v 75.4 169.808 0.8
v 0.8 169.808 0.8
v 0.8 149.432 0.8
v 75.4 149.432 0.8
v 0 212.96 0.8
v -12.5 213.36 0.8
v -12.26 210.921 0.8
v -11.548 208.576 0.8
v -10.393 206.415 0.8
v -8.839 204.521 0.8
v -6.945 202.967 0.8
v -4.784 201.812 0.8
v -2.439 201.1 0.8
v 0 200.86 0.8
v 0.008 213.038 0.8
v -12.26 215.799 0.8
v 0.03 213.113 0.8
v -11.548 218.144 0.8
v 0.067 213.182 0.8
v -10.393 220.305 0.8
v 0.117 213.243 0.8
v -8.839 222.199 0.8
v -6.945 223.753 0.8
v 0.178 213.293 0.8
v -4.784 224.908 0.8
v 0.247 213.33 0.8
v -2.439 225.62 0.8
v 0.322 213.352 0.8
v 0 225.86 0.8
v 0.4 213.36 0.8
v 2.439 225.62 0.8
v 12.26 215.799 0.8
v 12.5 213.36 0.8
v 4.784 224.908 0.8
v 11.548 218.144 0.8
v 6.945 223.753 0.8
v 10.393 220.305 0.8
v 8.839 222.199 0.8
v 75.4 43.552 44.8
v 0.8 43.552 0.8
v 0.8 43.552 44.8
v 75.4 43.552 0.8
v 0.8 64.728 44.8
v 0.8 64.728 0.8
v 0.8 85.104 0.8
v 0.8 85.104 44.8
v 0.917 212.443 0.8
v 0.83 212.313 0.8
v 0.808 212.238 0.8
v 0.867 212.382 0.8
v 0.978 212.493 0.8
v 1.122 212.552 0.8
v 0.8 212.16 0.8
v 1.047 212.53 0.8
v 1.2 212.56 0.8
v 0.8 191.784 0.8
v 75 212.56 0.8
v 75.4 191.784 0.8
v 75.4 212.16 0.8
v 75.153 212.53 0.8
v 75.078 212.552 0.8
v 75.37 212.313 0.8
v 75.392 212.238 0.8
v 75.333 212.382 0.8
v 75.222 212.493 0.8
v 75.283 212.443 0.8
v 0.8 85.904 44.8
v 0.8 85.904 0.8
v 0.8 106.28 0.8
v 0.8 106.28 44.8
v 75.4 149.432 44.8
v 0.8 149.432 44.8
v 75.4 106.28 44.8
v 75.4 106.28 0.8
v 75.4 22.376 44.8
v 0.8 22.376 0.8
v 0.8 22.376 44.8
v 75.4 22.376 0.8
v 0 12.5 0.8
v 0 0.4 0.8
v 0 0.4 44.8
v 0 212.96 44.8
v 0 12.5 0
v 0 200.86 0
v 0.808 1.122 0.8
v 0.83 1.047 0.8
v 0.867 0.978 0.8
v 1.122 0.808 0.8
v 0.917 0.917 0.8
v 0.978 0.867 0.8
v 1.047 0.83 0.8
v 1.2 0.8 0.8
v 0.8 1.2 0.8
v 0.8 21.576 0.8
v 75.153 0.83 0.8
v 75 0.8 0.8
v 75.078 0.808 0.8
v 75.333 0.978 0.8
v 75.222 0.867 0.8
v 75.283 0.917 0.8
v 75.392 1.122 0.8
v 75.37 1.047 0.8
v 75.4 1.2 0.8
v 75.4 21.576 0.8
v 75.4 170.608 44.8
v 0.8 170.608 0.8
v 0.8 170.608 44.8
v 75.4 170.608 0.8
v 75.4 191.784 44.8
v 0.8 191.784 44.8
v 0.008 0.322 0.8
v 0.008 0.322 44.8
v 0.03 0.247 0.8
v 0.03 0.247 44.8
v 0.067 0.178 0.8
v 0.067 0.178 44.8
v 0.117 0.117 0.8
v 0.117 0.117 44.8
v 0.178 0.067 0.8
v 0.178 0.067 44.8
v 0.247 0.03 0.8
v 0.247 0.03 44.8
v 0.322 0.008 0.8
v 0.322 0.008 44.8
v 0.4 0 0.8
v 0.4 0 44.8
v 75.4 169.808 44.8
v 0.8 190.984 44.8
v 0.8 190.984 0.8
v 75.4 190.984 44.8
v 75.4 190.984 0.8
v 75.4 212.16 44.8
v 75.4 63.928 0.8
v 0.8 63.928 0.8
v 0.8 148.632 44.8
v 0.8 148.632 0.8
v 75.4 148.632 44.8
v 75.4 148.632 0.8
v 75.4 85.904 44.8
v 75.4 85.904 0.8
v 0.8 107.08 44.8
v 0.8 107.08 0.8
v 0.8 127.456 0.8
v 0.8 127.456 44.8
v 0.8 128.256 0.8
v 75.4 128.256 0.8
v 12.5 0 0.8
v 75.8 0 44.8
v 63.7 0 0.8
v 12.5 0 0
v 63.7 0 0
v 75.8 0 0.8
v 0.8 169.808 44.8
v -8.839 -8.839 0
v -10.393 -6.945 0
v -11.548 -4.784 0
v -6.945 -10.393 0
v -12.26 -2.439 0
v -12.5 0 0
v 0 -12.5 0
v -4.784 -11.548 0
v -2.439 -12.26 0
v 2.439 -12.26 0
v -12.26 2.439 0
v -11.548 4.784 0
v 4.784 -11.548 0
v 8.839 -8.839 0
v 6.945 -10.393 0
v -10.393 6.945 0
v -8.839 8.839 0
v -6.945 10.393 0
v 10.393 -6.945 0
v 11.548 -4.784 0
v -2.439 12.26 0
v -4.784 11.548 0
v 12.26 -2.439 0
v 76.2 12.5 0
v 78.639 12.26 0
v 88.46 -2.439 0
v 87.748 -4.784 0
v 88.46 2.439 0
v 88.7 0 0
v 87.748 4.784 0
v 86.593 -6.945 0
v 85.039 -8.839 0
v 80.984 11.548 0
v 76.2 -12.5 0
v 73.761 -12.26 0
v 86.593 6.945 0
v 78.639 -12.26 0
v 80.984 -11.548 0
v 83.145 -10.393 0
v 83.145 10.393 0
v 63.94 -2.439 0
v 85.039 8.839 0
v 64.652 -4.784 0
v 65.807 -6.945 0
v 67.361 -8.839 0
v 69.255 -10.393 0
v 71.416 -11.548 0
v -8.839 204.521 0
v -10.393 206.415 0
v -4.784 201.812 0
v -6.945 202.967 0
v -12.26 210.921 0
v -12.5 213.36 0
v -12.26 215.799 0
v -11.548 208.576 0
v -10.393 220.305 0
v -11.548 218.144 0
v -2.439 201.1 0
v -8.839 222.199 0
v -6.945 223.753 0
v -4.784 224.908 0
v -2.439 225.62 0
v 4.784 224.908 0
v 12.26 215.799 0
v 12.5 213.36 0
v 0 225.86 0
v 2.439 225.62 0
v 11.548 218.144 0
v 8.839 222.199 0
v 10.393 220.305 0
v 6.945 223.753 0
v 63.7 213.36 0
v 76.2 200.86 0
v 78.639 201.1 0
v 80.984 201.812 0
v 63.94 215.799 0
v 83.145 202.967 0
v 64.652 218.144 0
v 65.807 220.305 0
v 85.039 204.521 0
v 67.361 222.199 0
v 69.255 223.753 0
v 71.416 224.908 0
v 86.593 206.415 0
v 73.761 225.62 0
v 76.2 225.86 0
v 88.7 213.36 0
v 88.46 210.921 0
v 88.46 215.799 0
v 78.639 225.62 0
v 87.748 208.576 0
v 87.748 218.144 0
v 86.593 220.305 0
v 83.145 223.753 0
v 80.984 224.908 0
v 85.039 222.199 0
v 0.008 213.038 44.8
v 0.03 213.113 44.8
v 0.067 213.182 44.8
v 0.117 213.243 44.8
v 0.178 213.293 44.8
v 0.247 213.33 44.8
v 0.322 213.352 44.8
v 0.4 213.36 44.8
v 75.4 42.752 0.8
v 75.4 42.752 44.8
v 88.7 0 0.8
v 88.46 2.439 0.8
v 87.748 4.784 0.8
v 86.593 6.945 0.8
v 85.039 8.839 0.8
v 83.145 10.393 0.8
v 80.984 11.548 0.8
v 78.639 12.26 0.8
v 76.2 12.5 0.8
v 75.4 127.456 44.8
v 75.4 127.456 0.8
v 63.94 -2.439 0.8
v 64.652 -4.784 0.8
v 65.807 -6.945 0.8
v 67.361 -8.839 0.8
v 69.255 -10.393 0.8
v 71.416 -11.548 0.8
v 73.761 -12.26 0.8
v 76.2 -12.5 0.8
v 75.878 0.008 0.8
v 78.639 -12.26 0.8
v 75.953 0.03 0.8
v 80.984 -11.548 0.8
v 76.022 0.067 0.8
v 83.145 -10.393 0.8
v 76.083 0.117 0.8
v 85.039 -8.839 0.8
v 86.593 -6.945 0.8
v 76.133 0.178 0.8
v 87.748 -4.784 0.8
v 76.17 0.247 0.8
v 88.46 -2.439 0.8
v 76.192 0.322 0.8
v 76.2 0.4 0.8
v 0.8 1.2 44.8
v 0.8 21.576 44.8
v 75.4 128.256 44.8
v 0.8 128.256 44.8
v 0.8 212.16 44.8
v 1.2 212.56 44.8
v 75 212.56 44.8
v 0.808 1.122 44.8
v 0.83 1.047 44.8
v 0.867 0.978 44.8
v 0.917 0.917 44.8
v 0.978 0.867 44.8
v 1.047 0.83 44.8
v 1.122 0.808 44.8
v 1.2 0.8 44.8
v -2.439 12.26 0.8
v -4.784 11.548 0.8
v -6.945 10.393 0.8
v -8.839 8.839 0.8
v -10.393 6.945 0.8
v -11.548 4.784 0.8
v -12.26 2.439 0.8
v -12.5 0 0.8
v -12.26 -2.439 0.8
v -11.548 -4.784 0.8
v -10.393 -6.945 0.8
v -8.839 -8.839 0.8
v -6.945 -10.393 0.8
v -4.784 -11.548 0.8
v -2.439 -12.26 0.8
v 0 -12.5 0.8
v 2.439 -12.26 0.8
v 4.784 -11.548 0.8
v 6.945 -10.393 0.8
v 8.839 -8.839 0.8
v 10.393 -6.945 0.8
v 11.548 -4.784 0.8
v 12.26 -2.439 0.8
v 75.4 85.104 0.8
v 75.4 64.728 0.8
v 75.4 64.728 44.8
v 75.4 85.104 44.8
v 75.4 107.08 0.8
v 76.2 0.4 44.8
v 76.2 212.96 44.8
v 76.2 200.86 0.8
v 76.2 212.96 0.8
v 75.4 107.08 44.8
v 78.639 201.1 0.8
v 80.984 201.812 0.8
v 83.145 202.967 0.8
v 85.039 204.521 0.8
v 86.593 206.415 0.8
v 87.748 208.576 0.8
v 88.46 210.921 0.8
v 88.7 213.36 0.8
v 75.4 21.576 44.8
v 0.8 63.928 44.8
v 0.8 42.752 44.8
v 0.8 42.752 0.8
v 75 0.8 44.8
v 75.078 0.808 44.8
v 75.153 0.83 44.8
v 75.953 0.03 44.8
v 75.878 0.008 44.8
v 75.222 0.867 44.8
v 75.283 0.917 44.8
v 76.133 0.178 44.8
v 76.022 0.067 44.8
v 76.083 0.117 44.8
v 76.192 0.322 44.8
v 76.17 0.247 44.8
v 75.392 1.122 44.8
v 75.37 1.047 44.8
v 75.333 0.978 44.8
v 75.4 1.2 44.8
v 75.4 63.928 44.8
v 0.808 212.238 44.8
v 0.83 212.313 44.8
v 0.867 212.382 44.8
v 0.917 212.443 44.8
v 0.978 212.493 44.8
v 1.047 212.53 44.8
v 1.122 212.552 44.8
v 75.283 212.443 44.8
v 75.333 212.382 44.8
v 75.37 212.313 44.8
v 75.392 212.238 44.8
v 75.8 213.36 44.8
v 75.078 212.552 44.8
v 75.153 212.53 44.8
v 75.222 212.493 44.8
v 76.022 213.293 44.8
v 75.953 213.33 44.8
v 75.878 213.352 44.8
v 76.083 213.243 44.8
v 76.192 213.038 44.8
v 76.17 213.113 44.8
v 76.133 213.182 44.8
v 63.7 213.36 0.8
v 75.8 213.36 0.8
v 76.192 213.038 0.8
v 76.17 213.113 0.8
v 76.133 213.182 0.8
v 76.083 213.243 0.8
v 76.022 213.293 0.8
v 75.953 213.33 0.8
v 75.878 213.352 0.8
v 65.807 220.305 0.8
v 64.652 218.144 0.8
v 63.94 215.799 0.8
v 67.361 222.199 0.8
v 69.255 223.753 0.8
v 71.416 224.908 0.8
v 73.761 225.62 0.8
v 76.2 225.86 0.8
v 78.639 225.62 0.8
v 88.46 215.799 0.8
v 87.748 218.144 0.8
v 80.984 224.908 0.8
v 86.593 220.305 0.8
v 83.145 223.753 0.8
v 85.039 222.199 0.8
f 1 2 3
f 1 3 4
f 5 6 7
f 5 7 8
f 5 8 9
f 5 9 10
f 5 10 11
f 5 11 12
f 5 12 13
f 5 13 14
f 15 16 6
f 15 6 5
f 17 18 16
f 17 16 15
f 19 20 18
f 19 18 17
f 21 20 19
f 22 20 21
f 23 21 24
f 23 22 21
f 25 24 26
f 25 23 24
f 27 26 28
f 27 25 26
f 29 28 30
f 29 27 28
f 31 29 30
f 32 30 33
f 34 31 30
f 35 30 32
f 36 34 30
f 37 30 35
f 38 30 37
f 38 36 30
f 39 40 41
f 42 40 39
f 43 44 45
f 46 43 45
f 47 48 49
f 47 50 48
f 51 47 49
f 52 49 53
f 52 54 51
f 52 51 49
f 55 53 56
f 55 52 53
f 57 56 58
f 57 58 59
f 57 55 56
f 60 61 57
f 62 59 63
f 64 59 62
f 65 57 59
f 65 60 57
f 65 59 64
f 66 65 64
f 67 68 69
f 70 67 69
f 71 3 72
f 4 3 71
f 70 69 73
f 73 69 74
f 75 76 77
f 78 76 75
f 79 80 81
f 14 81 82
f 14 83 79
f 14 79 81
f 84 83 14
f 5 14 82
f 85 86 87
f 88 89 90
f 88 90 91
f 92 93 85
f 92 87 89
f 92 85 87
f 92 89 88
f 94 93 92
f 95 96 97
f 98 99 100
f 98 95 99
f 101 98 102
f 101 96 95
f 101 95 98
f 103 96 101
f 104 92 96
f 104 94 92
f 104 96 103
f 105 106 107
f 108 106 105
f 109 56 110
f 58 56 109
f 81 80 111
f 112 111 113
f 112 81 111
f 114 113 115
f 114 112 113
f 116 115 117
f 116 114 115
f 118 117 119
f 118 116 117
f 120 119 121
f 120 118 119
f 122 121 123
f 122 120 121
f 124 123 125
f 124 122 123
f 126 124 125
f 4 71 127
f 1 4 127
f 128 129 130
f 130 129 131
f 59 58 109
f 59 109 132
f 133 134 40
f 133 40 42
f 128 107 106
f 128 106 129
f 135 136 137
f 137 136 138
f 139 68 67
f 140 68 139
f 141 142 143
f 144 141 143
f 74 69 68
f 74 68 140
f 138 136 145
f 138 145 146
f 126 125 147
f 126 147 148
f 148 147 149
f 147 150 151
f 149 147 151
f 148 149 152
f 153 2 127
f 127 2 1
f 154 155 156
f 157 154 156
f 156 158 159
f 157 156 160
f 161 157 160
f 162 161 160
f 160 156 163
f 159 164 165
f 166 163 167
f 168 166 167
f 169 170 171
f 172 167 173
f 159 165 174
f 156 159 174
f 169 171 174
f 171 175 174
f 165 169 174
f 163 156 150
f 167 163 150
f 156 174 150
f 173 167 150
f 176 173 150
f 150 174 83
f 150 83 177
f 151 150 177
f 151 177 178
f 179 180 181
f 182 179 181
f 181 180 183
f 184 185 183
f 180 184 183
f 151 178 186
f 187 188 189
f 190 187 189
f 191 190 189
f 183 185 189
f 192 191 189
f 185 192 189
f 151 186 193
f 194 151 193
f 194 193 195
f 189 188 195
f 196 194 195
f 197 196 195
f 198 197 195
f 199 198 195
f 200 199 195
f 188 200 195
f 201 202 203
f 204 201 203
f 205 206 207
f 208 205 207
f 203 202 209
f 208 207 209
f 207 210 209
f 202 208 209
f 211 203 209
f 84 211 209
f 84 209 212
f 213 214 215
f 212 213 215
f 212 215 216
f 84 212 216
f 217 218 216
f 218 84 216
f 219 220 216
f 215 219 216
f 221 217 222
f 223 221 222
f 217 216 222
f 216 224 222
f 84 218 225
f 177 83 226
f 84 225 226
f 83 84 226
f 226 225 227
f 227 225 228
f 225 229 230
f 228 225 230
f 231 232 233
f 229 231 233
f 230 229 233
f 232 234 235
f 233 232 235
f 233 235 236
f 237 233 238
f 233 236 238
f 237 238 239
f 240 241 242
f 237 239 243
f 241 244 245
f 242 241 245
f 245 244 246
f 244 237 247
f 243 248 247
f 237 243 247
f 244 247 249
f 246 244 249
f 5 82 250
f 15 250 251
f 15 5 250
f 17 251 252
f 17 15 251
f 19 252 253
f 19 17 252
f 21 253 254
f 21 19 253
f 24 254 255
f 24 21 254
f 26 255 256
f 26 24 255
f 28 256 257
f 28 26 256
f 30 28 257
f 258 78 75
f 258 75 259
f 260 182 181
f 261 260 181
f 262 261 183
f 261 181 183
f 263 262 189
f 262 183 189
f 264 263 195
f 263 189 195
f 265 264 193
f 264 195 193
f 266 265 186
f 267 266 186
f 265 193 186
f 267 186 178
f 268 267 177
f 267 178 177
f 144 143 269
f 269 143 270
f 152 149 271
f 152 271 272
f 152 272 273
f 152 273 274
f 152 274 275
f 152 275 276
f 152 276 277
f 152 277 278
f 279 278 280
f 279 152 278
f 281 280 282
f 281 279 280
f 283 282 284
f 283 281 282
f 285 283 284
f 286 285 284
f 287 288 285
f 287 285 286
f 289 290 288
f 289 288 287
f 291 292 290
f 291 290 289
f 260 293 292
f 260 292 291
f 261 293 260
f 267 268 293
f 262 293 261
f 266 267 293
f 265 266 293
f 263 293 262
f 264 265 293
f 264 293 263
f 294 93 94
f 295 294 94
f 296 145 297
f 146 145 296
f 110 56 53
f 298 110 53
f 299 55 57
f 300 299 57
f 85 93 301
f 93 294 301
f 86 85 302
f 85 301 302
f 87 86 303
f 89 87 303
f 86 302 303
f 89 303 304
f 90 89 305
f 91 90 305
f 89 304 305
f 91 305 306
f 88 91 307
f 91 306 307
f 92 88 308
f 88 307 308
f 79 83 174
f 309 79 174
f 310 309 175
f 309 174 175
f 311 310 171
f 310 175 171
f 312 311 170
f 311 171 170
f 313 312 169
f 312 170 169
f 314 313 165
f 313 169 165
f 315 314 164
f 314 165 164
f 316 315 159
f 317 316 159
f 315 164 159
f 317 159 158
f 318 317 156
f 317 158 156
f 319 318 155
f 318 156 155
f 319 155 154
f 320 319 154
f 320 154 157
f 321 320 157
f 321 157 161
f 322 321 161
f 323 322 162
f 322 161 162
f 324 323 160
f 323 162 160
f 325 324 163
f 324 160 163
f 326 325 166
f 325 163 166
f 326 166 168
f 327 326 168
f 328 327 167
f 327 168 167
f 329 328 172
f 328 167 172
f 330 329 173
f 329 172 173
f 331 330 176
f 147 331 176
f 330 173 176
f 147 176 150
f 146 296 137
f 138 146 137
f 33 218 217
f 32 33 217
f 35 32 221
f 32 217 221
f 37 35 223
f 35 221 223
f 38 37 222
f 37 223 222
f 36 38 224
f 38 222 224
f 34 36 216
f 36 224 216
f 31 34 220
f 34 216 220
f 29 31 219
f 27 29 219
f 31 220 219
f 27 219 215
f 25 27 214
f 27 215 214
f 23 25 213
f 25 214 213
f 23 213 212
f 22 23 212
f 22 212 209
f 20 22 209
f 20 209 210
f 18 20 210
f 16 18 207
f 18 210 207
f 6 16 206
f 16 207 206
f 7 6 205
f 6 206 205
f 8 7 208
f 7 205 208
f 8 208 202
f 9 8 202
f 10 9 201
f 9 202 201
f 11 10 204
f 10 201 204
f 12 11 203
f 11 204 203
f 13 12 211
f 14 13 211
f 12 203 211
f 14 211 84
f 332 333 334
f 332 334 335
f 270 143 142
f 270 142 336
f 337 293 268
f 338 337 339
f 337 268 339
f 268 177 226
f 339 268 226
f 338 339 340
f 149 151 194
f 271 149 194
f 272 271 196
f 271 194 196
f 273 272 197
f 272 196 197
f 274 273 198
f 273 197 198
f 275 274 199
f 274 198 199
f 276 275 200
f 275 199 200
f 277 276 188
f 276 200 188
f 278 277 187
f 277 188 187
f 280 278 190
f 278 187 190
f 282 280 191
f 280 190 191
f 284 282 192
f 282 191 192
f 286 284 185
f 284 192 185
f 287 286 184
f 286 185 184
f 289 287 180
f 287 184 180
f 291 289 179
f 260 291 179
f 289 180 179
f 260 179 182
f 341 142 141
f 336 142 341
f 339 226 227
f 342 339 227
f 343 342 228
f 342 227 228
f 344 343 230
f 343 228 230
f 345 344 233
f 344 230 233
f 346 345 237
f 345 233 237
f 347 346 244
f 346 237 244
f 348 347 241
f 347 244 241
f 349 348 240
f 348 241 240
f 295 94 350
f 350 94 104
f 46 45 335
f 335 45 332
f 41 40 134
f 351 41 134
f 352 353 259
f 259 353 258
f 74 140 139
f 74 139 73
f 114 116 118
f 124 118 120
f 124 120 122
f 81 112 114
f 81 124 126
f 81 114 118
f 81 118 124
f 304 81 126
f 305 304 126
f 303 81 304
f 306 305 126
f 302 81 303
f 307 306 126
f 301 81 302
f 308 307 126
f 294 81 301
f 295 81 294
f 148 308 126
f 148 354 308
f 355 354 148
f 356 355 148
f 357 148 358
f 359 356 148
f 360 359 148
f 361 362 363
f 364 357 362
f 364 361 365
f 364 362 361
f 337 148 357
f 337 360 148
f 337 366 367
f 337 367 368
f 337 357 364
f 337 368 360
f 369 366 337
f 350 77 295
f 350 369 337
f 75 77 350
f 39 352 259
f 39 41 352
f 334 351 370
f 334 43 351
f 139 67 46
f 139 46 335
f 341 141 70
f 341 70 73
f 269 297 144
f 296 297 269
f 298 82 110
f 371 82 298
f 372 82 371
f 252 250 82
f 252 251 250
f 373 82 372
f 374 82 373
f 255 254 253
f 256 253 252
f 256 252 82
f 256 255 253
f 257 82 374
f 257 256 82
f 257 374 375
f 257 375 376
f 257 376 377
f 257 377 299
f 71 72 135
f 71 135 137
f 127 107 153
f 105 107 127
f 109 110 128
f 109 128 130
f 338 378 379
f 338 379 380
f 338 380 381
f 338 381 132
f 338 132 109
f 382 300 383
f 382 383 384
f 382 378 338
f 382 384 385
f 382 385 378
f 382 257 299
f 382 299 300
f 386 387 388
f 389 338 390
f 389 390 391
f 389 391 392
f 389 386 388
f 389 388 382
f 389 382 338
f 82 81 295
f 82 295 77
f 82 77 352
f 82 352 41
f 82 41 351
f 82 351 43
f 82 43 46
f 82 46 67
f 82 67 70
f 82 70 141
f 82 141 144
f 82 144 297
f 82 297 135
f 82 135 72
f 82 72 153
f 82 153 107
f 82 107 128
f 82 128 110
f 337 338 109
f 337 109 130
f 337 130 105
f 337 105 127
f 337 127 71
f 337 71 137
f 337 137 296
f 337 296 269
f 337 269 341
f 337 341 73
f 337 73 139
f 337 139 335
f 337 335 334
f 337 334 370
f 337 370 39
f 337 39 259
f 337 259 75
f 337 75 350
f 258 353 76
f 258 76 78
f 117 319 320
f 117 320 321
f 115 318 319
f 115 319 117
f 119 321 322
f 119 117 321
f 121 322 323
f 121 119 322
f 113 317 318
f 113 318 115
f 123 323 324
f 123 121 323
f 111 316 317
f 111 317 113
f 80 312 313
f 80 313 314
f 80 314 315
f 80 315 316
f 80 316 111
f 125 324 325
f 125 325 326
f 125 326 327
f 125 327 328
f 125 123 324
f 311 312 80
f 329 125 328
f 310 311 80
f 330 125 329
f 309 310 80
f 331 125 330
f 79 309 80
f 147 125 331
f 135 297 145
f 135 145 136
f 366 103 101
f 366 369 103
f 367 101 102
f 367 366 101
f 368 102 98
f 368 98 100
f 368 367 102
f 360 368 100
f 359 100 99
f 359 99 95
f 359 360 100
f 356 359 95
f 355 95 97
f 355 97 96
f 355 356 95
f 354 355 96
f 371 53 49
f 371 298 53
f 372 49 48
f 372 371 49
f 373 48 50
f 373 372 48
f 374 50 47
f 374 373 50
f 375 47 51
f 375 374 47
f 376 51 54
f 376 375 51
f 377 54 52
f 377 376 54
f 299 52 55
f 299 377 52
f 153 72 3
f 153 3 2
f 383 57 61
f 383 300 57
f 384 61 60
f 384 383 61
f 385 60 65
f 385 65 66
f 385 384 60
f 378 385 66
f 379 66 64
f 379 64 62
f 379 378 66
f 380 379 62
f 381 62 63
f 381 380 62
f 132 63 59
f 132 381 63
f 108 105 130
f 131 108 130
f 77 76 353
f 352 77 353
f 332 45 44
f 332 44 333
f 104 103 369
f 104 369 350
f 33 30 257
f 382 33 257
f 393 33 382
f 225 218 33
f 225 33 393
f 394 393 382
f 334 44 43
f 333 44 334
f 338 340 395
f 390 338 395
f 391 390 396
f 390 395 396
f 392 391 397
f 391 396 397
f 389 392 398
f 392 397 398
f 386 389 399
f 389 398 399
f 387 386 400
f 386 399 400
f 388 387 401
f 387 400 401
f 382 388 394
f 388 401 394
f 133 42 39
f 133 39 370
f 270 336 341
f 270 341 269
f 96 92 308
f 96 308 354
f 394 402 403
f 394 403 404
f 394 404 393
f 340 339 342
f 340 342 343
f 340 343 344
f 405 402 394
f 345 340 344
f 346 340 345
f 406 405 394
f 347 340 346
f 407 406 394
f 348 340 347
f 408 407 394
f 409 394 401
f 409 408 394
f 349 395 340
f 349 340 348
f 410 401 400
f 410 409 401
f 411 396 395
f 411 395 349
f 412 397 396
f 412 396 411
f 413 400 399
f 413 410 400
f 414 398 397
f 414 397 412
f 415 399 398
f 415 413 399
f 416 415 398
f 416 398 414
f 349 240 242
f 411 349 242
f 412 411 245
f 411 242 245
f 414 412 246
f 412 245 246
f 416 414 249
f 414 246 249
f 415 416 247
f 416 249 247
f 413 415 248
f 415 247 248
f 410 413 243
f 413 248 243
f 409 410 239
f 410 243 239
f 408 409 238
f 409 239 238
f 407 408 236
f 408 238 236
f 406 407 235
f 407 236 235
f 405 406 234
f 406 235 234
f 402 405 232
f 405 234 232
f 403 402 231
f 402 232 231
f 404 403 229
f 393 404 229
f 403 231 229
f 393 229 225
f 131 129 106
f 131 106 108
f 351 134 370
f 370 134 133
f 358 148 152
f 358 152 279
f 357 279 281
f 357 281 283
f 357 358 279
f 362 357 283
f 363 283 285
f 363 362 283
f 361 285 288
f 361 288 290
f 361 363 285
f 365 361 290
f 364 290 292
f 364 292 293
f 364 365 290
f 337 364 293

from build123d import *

# Parameters (mm, degrees)
F1_DEPTH = 0.8
F2_W     = 76.2
F2_H     = 213.36
F2_W_2   = 74.6
F2_H_2   = 20.776
F2_H_3   = 20.376
F3_DEPTH = 44
F4_R     = 0.4
F5_DEPTH = 0.8


with BuildPart() as f1:
    # F0 (on Top) → F1 (new body)
    with BuildSketch(Plane.XY):
        with BuildLine():
            Line((0, 12.5), (0, 0))
            Line((0, 0), (12.5, 0))
            ThreePointArc((12.5, 0), (8.8388347648, 8.8388347648), (0, 12.5))
        make_face()
        with BuildLine():
            ThreePointArc((0, 12.5), (8.8388347648, 8.8388347648), (12.5, 0))
            Line((12.5, 0), (63.7, 0))
            ThreePointArc((63.7, 0), (67.3611652352, 8.8388347648), (76.2, 12.5))
            Line((76.2, 12.5), (76.2, 200.86))
            ThreePointArc((76.2, 200.86), (67.3611652352, 204.5211652352), (63.7, 213.36))
            Line((63.7, 213.36), (12.5, 213.36))
            ThreePointArc((12.5, 213.36), (8.8388347648, 204.5211652352), (0, 200.86))
            Line((0, 200.86), (0, 12.5))
        make_face()
        with BuildLine():
            ThreePointArc((76.2, 12.5), (67.3611652352, 8.8388347648), (63.7, 0))
            Line((63.7, 0), (76.2, 0))
            Line((76.2, 0), (76.2, 12.5))
        make_face()
        with BuildLine():
            ThreePointArc((63.7, 213.36), (67.3611652352, 204.5211652352), (76.2, 200.86))
            Line((76.2, 200.86), (76.2, 213.36))
            Line((76.2, 213.36), (63.7, 213.36))
        make_face()
        with BuildLine():
            Line((0, 213.36), (0, 200.86))
            ThreePointArc((0, 200.86), (8.8388347648, 204.5211652352), (12.5, 213.36))
            Line((12.5, 213.36), (0, 213.36))
        make_face()
    extrude(amount=F1_DEPTH)

    # F2 (on face) → F3 (join)
    with BuildSketch(Plane.XY.offset(0.8)):
        with Locations((38.1, 106.68)):
            Rectangle(F2_W, F2_H)
        with Locations((38.1, 11.188)):
            Rectangle(F2_W_2, F2_H_2, mode=Mode.SUBTRACT)
        with Locations((38.1, 32.564)):
            Rectangle(F2_W_2, F2_H_3, mode=Mode.SUBTRACT)
        with Locations((38.1, 53.74)):
            Rectangle(F2_W_2, F2_H_3, mode=Mode.SUBTRACT)
        with Locations((38.1, 74.916)):
            Rectangle(F2_W_2, F2_H_3, mode=Mode.SUBTRACT)
        with Locations((38.1, 96.092)):
            Rectangle(F2_W_2, F2_H_3, mode=Mode.SUBTRACT)
        with Locations((38.1, 117.268)):
            Rectangle(F2_W_2, F2_H_3, mode=Mode.SUBTRACT)
        with Locations((38.1, 138.444)):
            Rectangle(F2_W_2, F2_H_3, mode=Mode.SUBTRACT)
        with Locations((38.1, 159.62)):
            Rectangle(F2_W_2, F2_H_3, mode=Mode.SUBTRACT)
        with Locations((38.1, 180.796)):
            Rectangle(F2_W_2, F2_H_3, mode=Mode.SUBTRACT)
        with Locations((38.1, 202.172)):
            Rectangle(F2_W_2, F2_H_2, mode=Mode.SUBTRACT)
    extrude(amount=F3_DEPTH)

    # F4
    f4_edges = [f1.edges().sort_by_distance(p)[0] for p in [
        (75.4, 0.8, 22.8),
        (76.2, 0, 22.4),
        (0.8, 0.8, 22.8),
        (0, 0, 22.4),
        (0, 213.36, 22.4),
        (0.8, 212.56, 22.8),
        (76.2, 213.36, 22.4),
        (75.4, 212.56, 22.8),
    ]]
    fillet(f4_edges, radius=F4_R)

    # F0 (on Top) → F5 (join, through all)
    with BuildSketch(Plane.XY):
        with BuildLine():
            Line((76.2, 0), (63.7, 0))
            ThreePointArc((63.7, 0), (76.2, -12.5), (88.7, 0))
            ThreePointArc((88.7, 0), (85.0388347648, 8.8388347648), (76.2, 12.5))
            Line((76.2, 12.5), (76.2, 0))
        make_face()
        with BuildLine():
            Line((12.5, 0), (0, 0))
            Line((0, 0), (0, 12.5))
            ThreePointArc((0, 12.5), (-8.8388347648, -8.8388347648), (12.5, 0))
        make_face()
        with BuildLine():
            ThreePointArc((12.5, 213.36), (-8.8388347648, 222.1988347648), (0, 200.86))
            Line((0, 200.86), (0, 213.36))
            Line((0, 213.36), (12.5, 213.36))
        make_face()
        with BuildLine():
            Line((76.2, 213.36), (76.2, 200.86))
            ThreePointArc((76.2, 200.86), (85.0388347648, 204.5211652352), (88.7, 213.36))
            ThreePointArc((88.7, 213.36), (76.2, 225.86), (63.7, 213.36))
            Line((63.7, 213.36), (76.2, 213.36))
        make_face()
        with BuildLine():
            ThreePointArc((76.2, 12.5), (67.3611652352, 8.8388347648), (63.7, 0))
            Line((63.7, 0), (76.2, 0))
            Line((76.2, 0), (76.2, 12.5))
        make_face()
        with BuildLine():
            Line((0, 12.5), (0, 0))
            Line((0, 0), (12.5, 0))
            ThreePointArc((12.5, 0), (8.8388347648, 8.8388347648), (0, 12.5))
        make_face()
        with BuildLine():
            Line((0, 213.36), (0, 200.86))
            ThreePointArc((0, 200.86), (8.8388347648, 204.5211652352), (12.5, 213.36))
            Line((12.5, 213.36), (0, 213.36))
        make_face()
        with BuildLine():
            ThreePointArc((63.7, 213.36), (67.3611652352, 204.5211652352), (76.2, 200.86))
            Line((76.2, 200.86), (76.2, 213.36))
            Line((76.2, 213.36), (63.7, 213.36))
        make_face()
    extrude(amount=F5_DEPTH)


solid = f1.part
